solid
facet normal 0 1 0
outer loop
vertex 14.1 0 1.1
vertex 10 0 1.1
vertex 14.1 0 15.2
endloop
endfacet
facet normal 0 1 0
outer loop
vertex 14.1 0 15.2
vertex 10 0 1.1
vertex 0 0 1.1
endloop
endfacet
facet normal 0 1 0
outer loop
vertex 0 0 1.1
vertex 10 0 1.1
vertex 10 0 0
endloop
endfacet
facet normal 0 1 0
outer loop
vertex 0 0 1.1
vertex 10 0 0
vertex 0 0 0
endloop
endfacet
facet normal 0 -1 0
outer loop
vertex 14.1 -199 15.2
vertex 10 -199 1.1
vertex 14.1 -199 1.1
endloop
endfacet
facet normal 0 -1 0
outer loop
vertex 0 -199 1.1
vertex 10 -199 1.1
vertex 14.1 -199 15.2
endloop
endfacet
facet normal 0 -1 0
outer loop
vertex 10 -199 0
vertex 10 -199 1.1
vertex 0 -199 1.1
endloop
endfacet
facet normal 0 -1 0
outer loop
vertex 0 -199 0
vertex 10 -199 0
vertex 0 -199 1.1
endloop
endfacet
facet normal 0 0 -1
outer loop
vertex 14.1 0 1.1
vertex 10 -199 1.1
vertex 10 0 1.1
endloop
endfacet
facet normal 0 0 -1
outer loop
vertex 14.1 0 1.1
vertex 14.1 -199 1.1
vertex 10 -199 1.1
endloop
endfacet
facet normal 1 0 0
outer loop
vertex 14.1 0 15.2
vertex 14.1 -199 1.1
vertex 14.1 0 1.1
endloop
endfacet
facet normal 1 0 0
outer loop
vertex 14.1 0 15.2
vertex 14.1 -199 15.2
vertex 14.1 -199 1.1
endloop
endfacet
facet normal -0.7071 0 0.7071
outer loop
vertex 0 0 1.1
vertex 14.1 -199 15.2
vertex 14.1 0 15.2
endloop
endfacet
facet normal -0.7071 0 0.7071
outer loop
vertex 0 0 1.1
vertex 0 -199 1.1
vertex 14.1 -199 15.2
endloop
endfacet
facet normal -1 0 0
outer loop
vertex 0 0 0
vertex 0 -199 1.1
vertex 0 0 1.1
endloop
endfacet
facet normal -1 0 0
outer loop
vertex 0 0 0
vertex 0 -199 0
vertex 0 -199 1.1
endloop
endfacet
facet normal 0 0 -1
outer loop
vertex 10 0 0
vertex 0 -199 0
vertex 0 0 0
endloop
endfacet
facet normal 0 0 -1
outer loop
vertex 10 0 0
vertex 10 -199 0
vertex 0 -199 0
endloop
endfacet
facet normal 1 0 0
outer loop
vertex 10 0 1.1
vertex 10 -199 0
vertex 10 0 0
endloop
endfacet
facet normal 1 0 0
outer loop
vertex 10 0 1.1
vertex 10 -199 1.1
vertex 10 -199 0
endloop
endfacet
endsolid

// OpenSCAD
platform_height = 1.1;
platform_width = 10;
triangle_height = 14.1;
triangle_width = 14.1;
triangle_length = 199;

points = [[0,0],[0,platform_height],[triangle_width,platform_height+triangle_height],[triangle_width,platform_height],[platform_width,platform_height],[platform_width,0]];

rotate([90,0,0]) {
    linear_extrude(triangle_length)
        polygon(points);
}
